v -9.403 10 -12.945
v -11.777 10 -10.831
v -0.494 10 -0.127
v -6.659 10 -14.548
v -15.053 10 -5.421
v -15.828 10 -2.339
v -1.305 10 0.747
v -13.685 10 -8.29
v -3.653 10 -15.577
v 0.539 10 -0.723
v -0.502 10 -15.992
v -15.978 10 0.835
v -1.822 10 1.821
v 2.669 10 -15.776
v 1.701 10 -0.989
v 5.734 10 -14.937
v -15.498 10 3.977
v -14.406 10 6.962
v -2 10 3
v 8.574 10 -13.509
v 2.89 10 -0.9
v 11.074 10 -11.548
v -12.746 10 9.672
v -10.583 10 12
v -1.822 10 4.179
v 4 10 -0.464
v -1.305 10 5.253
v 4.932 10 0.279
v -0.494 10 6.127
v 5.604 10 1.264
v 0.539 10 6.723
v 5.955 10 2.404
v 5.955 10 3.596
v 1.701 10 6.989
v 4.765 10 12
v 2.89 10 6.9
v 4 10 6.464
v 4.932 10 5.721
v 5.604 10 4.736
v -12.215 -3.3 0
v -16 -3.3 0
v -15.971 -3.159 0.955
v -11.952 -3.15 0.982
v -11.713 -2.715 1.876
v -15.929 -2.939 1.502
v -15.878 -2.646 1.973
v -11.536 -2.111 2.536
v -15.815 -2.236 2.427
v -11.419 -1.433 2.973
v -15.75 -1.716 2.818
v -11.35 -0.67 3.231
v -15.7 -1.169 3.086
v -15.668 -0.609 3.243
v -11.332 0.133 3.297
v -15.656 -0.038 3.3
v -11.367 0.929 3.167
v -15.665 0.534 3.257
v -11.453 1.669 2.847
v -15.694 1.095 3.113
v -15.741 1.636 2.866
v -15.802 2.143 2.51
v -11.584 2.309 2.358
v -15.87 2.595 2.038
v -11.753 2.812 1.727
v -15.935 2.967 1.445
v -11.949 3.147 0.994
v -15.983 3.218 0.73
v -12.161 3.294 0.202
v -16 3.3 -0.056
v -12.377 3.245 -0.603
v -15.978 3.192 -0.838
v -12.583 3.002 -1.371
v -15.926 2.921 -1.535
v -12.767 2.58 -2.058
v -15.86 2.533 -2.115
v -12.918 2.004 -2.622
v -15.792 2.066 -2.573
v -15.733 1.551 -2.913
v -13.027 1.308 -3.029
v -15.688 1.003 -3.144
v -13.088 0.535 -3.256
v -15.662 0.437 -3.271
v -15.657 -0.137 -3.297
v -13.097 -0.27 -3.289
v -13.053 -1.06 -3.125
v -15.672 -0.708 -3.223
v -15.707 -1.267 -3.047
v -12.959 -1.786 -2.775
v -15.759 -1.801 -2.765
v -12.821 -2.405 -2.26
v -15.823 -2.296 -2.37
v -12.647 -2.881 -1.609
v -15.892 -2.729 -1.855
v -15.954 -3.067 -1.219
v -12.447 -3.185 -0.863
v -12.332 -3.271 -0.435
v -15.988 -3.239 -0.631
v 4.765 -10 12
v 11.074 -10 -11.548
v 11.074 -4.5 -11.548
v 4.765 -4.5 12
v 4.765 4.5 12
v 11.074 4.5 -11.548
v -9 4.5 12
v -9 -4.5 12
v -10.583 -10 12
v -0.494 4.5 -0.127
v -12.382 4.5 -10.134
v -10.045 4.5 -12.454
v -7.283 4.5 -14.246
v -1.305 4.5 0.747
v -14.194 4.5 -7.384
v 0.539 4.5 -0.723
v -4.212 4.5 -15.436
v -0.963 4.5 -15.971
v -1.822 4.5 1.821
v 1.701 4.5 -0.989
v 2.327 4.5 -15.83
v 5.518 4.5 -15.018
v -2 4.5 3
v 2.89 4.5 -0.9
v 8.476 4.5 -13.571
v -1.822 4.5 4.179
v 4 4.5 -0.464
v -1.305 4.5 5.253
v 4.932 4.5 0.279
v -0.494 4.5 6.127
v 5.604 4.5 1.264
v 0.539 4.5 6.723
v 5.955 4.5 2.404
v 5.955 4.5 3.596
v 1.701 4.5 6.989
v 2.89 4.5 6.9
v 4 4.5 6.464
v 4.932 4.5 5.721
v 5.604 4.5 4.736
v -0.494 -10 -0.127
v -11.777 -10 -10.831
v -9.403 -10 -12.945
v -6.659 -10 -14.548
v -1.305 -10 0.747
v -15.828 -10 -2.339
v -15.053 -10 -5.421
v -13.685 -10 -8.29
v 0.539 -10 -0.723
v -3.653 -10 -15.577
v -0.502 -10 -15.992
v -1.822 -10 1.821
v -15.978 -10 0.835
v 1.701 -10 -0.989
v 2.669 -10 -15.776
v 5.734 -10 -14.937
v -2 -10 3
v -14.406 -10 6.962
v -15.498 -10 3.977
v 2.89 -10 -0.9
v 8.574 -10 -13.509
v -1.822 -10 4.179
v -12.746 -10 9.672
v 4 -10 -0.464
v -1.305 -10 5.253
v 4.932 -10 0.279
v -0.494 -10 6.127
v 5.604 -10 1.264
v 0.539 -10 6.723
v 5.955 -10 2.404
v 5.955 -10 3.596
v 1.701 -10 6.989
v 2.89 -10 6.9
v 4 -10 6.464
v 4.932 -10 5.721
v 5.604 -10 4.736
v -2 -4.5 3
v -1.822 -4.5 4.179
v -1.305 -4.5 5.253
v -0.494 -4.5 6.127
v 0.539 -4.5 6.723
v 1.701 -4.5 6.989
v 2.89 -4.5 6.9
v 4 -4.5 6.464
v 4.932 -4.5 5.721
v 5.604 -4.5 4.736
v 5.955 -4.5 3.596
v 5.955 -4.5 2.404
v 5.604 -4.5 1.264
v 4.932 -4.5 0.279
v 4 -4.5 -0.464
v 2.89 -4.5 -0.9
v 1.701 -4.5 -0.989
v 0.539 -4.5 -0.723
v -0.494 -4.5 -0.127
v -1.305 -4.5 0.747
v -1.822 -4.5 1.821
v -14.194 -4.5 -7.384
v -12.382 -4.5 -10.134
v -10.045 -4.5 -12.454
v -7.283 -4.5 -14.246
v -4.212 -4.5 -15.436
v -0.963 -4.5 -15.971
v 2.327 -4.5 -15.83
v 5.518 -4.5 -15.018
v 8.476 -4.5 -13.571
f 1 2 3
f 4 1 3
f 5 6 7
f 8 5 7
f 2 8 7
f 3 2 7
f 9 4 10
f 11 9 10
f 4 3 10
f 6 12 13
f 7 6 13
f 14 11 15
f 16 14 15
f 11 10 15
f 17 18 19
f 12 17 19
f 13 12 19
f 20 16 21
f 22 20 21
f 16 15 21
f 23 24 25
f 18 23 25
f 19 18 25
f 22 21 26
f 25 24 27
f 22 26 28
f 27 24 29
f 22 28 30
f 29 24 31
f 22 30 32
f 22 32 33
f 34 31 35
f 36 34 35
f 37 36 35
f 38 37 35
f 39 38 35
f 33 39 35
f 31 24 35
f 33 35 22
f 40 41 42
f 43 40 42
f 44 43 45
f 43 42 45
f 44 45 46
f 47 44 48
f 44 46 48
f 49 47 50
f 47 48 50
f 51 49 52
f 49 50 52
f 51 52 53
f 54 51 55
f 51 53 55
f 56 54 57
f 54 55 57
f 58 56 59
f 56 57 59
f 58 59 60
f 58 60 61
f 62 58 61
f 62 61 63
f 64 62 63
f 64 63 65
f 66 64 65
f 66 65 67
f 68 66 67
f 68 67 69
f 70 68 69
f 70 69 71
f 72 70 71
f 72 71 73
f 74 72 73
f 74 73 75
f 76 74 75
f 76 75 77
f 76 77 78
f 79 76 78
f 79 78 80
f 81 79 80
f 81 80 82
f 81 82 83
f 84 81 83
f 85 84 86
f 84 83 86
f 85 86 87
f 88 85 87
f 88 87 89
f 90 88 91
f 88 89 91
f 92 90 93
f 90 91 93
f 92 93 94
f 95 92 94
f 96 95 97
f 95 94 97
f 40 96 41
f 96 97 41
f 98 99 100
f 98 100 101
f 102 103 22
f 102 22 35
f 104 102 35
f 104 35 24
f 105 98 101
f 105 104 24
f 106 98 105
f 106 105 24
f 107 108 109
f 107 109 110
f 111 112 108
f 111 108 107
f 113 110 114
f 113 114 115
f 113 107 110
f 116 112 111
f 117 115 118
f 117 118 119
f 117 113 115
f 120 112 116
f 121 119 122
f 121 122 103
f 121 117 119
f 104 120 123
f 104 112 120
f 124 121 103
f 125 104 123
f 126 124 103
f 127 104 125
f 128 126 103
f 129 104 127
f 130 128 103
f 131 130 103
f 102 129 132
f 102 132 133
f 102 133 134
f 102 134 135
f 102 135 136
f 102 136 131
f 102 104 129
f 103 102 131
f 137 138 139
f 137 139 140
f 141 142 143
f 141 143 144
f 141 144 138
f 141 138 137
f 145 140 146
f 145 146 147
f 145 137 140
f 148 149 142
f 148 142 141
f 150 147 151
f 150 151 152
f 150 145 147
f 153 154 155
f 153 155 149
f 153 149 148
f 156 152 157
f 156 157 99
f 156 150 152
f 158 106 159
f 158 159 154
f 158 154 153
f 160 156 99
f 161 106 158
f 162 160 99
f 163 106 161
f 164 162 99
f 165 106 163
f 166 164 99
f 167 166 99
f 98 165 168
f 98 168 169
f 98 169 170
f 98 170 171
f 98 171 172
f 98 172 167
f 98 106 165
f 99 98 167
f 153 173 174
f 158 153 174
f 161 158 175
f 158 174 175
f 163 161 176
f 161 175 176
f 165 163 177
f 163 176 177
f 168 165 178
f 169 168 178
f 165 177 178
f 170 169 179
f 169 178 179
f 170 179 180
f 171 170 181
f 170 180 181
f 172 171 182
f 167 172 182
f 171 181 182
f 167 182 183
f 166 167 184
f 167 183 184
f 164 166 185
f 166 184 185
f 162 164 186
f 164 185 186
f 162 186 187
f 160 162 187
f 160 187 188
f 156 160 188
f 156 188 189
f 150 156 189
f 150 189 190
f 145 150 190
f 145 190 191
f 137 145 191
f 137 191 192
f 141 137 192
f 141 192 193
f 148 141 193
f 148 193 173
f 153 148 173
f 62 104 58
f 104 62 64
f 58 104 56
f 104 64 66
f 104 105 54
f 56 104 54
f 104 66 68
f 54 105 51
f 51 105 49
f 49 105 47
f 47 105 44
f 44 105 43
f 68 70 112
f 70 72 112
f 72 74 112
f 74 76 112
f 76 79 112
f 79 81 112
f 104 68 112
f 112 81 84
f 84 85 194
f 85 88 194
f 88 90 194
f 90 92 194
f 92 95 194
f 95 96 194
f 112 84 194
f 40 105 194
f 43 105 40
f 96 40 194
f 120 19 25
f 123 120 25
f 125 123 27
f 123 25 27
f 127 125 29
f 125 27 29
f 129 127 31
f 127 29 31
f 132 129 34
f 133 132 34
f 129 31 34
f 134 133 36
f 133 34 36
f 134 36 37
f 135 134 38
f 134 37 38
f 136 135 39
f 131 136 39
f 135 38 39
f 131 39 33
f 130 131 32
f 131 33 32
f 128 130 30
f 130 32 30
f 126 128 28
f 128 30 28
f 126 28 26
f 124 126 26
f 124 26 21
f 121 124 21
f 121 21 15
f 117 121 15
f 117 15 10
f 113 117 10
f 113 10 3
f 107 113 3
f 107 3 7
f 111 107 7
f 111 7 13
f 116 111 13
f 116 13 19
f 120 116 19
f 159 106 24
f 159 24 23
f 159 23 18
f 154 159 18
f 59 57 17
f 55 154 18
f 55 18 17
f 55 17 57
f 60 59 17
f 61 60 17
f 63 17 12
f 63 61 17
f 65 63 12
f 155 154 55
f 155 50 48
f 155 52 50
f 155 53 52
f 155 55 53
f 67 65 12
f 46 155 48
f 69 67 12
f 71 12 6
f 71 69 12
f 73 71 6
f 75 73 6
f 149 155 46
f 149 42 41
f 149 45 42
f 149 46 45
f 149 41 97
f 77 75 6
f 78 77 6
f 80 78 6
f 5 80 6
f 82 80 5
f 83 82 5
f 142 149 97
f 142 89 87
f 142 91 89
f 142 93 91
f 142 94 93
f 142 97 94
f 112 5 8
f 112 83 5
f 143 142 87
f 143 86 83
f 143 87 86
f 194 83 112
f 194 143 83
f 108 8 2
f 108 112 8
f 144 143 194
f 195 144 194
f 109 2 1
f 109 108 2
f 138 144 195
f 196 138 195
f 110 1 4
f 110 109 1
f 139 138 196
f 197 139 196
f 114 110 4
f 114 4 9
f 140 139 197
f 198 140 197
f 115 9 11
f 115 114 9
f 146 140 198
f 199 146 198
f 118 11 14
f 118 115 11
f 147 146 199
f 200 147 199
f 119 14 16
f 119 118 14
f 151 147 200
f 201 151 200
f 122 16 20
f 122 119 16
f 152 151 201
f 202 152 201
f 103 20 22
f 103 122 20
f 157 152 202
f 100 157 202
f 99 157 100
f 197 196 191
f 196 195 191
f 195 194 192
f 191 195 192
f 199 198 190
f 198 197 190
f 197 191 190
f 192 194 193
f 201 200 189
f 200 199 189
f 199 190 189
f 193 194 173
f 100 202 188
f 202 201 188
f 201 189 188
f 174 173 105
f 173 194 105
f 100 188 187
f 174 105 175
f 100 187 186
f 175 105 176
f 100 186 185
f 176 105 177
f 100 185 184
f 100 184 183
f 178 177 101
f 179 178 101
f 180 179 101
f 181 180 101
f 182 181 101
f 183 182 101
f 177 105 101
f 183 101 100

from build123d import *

# Parameters (mm, degrees)
F2_DEPTH = 10
F3_DEPTH = 4.5
F5_D     = 8
F7_D     = 6.6


with BuildPart() as f2:
    # F0 (on Front) → F2 (new body, symmetric)
    with BuildSketch(Plane.XZ):
        with BuildLine():
            Line((4.7648381702, 12), (-10.5830052443, 12))
            ThreePointArc((-10.5830052443, 12), (-11.7765474066, -10.831109416), (11.0744966927, -11.5479661847))
            Line((11.0744966927, -11.5479661847), (4.7648381702, 12))
        make_face()
    extrude(amount=F2_DEPTH, both=True)

    # F1 (on Front) → F3 (cut, symmetric)
    with BuildSketch(Plane.XZ):
        Polygon((11.0744966927, 12), (-9, 12), (-16.5025773881, -16), (11.0744966927, -16), align=None)
    extrude(amount=F3_DEPTH, both=True, mode=Mode.SUBTRACT)

    # F5 (through all)
    with Locations(Plane.XZ.offset(10)):
        with Locations((2, 3)):
            Hole(F5_D / 2)

    # F7 (through all)
    with Locations(Plane.YZ):
        with Locations((0, 0)):
            Hole(F7_D / 2)


solid = f2.part
